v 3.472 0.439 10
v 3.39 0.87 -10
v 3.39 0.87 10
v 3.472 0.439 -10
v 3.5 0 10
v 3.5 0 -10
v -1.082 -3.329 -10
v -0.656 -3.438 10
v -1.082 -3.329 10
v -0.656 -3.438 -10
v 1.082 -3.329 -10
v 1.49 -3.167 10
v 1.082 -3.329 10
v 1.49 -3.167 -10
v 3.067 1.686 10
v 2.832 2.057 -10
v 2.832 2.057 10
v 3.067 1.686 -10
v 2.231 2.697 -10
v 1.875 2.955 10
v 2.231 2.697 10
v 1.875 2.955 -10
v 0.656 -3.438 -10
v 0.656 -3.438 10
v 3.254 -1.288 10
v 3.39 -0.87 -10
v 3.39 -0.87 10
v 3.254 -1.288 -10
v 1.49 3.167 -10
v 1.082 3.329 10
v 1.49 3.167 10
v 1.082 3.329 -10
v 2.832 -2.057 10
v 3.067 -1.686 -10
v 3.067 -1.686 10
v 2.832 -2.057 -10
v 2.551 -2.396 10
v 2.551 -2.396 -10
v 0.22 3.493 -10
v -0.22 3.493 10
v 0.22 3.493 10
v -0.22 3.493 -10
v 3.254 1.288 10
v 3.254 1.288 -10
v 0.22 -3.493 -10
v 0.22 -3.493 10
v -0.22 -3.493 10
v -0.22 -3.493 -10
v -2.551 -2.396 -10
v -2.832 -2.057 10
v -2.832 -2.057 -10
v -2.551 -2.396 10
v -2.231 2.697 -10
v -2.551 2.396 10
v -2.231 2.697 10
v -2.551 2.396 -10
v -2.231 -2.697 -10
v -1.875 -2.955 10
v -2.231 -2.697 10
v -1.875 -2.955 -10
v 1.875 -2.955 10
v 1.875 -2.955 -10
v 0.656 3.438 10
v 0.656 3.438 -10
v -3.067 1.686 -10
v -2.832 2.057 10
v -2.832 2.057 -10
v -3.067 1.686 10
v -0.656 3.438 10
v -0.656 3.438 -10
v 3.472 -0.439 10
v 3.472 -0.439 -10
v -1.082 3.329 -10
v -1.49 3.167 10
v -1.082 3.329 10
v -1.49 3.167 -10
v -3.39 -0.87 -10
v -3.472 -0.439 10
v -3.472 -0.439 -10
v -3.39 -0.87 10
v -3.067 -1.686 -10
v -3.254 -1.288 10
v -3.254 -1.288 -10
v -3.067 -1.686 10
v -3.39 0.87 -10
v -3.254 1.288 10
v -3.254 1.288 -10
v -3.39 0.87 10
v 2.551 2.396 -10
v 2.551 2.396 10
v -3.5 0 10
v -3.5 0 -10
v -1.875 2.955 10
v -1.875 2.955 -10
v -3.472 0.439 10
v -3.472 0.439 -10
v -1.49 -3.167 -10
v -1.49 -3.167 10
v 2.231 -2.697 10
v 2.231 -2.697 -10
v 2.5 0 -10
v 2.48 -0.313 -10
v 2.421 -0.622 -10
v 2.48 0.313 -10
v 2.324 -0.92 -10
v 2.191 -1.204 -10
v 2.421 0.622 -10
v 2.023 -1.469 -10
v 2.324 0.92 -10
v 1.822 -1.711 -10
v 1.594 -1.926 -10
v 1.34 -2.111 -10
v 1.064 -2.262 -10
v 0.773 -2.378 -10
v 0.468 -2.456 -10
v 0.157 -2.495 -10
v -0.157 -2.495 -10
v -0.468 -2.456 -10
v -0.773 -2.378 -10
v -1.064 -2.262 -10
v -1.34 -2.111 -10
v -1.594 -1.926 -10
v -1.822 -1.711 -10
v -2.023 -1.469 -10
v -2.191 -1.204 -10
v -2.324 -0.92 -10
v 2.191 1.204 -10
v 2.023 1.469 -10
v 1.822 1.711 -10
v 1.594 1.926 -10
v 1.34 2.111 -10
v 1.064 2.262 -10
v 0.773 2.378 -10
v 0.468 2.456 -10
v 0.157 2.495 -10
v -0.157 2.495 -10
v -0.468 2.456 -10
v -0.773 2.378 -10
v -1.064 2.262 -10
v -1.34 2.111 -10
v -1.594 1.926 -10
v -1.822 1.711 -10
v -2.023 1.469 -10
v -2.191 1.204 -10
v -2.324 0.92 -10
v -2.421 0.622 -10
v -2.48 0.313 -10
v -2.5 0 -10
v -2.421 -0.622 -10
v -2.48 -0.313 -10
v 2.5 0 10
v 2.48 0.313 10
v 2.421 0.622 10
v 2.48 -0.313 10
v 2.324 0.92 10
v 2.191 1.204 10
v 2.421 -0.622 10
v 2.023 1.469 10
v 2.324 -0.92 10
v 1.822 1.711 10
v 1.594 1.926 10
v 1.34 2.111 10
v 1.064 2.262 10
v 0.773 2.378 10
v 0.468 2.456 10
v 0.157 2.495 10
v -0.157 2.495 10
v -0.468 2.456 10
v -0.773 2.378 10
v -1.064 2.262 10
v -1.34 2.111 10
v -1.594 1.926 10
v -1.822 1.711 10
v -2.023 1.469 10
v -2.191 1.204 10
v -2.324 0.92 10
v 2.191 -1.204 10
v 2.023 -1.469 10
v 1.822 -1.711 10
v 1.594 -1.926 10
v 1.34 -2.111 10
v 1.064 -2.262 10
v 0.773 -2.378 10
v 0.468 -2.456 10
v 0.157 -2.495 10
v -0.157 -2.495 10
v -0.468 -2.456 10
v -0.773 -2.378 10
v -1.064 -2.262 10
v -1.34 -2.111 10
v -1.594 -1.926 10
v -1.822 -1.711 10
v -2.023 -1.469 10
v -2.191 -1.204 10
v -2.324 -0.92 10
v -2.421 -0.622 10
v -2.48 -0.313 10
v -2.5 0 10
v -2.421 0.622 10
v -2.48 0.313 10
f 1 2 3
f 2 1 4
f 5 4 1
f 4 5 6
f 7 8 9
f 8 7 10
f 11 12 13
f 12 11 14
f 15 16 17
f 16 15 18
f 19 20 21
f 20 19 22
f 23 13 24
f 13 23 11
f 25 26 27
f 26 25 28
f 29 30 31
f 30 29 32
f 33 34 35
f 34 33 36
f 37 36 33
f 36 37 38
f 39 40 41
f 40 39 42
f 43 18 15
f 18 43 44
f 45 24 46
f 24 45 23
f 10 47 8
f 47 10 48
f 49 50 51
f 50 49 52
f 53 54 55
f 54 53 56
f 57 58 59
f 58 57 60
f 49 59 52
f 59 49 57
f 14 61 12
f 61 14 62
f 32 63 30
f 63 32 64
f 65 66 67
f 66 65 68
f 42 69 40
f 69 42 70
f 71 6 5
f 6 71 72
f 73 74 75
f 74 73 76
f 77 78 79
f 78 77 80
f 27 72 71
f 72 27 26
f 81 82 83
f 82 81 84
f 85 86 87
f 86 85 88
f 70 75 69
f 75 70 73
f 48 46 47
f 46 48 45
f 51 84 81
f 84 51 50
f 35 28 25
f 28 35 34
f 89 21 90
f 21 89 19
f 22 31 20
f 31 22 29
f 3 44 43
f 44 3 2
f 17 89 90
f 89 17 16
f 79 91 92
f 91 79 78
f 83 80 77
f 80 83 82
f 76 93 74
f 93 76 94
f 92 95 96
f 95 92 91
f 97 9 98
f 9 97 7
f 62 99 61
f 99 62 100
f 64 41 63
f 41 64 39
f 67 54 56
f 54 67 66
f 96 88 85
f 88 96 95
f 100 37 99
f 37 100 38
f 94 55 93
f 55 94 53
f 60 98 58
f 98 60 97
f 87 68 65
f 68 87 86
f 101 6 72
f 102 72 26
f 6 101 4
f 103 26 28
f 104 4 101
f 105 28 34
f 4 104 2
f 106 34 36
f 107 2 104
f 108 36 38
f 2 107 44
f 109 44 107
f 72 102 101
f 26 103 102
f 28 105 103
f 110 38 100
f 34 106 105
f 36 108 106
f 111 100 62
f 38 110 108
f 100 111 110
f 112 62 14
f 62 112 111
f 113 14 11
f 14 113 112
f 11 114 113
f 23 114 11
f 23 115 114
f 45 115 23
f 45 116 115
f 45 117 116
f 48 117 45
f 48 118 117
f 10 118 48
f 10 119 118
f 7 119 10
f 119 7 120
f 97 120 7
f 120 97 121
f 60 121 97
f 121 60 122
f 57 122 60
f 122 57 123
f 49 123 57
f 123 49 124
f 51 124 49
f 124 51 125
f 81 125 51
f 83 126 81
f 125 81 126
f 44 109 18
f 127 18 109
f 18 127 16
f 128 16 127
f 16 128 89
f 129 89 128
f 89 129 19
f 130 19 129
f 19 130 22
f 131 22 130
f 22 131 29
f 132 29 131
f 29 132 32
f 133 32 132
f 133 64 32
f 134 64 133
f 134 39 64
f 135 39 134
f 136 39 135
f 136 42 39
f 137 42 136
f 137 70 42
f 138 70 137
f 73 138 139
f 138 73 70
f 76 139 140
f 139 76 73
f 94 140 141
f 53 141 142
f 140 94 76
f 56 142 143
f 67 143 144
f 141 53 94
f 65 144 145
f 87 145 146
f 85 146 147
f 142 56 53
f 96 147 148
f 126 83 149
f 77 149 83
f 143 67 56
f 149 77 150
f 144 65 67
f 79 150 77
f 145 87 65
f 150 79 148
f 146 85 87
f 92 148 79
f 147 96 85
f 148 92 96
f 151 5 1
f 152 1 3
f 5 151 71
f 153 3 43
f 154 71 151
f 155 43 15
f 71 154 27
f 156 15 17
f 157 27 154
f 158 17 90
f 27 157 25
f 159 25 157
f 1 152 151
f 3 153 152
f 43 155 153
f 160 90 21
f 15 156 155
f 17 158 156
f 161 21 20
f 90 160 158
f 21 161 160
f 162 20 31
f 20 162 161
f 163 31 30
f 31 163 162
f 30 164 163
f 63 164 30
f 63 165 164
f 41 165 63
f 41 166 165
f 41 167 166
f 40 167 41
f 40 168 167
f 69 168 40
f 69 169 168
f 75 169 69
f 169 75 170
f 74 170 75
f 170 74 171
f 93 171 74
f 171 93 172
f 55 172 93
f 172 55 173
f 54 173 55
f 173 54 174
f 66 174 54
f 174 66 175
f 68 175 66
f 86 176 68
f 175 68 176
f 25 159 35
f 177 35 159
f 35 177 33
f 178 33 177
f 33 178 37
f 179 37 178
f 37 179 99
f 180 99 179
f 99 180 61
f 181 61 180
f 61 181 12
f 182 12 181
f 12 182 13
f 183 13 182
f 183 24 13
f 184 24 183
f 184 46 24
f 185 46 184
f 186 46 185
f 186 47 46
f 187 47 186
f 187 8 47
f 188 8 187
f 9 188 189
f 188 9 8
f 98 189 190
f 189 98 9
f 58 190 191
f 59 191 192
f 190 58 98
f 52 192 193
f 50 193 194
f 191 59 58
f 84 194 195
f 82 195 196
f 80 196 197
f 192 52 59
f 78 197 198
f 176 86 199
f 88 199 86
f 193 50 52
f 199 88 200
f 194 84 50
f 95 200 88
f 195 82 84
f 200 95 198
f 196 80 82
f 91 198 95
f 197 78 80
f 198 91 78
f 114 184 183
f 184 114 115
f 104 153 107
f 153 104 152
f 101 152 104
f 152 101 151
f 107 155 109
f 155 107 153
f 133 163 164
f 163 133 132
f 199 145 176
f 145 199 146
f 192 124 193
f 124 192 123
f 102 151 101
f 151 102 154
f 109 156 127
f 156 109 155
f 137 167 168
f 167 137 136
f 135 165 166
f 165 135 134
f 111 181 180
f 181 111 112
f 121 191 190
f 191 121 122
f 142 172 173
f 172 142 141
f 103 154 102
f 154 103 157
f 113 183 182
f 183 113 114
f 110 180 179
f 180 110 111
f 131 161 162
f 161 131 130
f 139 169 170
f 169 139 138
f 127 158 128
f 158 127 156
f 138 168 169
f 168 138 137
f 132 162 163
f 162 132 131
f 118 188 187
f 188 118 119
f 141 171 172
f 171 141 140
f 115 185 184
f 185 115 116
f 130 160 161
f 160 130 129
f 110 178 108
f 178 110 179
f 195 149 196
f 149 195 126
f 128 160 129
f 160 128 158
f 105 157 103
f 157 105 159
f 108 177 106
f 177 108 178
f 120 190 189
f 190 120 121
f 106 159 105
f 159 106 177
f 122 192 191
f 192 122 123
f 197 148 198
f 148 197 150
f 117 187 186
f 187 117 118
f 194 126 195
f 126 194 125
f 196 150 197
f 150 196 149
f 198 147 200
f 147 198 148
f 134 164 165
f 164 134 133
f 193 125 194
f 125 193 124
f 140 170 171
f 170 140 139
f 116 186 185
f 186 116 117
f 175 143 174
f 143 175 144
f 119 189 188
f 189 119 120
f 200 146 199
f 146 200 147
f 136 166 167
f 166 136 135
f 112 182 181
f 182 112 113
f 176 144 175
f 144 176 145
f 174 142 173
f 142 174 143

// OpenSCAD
$fn = 50;


difference() {
	union() {
		translate(v = [0, 0, -10.0000000000]) {
			cylinder(h = 20, r = 3.5000000000);
		}
	}
	union() {
		translate(v = [0, 0, -100.0000000000]) {
			cylinder(h = 200, r = 2.5000000000);
		}
	}
}
